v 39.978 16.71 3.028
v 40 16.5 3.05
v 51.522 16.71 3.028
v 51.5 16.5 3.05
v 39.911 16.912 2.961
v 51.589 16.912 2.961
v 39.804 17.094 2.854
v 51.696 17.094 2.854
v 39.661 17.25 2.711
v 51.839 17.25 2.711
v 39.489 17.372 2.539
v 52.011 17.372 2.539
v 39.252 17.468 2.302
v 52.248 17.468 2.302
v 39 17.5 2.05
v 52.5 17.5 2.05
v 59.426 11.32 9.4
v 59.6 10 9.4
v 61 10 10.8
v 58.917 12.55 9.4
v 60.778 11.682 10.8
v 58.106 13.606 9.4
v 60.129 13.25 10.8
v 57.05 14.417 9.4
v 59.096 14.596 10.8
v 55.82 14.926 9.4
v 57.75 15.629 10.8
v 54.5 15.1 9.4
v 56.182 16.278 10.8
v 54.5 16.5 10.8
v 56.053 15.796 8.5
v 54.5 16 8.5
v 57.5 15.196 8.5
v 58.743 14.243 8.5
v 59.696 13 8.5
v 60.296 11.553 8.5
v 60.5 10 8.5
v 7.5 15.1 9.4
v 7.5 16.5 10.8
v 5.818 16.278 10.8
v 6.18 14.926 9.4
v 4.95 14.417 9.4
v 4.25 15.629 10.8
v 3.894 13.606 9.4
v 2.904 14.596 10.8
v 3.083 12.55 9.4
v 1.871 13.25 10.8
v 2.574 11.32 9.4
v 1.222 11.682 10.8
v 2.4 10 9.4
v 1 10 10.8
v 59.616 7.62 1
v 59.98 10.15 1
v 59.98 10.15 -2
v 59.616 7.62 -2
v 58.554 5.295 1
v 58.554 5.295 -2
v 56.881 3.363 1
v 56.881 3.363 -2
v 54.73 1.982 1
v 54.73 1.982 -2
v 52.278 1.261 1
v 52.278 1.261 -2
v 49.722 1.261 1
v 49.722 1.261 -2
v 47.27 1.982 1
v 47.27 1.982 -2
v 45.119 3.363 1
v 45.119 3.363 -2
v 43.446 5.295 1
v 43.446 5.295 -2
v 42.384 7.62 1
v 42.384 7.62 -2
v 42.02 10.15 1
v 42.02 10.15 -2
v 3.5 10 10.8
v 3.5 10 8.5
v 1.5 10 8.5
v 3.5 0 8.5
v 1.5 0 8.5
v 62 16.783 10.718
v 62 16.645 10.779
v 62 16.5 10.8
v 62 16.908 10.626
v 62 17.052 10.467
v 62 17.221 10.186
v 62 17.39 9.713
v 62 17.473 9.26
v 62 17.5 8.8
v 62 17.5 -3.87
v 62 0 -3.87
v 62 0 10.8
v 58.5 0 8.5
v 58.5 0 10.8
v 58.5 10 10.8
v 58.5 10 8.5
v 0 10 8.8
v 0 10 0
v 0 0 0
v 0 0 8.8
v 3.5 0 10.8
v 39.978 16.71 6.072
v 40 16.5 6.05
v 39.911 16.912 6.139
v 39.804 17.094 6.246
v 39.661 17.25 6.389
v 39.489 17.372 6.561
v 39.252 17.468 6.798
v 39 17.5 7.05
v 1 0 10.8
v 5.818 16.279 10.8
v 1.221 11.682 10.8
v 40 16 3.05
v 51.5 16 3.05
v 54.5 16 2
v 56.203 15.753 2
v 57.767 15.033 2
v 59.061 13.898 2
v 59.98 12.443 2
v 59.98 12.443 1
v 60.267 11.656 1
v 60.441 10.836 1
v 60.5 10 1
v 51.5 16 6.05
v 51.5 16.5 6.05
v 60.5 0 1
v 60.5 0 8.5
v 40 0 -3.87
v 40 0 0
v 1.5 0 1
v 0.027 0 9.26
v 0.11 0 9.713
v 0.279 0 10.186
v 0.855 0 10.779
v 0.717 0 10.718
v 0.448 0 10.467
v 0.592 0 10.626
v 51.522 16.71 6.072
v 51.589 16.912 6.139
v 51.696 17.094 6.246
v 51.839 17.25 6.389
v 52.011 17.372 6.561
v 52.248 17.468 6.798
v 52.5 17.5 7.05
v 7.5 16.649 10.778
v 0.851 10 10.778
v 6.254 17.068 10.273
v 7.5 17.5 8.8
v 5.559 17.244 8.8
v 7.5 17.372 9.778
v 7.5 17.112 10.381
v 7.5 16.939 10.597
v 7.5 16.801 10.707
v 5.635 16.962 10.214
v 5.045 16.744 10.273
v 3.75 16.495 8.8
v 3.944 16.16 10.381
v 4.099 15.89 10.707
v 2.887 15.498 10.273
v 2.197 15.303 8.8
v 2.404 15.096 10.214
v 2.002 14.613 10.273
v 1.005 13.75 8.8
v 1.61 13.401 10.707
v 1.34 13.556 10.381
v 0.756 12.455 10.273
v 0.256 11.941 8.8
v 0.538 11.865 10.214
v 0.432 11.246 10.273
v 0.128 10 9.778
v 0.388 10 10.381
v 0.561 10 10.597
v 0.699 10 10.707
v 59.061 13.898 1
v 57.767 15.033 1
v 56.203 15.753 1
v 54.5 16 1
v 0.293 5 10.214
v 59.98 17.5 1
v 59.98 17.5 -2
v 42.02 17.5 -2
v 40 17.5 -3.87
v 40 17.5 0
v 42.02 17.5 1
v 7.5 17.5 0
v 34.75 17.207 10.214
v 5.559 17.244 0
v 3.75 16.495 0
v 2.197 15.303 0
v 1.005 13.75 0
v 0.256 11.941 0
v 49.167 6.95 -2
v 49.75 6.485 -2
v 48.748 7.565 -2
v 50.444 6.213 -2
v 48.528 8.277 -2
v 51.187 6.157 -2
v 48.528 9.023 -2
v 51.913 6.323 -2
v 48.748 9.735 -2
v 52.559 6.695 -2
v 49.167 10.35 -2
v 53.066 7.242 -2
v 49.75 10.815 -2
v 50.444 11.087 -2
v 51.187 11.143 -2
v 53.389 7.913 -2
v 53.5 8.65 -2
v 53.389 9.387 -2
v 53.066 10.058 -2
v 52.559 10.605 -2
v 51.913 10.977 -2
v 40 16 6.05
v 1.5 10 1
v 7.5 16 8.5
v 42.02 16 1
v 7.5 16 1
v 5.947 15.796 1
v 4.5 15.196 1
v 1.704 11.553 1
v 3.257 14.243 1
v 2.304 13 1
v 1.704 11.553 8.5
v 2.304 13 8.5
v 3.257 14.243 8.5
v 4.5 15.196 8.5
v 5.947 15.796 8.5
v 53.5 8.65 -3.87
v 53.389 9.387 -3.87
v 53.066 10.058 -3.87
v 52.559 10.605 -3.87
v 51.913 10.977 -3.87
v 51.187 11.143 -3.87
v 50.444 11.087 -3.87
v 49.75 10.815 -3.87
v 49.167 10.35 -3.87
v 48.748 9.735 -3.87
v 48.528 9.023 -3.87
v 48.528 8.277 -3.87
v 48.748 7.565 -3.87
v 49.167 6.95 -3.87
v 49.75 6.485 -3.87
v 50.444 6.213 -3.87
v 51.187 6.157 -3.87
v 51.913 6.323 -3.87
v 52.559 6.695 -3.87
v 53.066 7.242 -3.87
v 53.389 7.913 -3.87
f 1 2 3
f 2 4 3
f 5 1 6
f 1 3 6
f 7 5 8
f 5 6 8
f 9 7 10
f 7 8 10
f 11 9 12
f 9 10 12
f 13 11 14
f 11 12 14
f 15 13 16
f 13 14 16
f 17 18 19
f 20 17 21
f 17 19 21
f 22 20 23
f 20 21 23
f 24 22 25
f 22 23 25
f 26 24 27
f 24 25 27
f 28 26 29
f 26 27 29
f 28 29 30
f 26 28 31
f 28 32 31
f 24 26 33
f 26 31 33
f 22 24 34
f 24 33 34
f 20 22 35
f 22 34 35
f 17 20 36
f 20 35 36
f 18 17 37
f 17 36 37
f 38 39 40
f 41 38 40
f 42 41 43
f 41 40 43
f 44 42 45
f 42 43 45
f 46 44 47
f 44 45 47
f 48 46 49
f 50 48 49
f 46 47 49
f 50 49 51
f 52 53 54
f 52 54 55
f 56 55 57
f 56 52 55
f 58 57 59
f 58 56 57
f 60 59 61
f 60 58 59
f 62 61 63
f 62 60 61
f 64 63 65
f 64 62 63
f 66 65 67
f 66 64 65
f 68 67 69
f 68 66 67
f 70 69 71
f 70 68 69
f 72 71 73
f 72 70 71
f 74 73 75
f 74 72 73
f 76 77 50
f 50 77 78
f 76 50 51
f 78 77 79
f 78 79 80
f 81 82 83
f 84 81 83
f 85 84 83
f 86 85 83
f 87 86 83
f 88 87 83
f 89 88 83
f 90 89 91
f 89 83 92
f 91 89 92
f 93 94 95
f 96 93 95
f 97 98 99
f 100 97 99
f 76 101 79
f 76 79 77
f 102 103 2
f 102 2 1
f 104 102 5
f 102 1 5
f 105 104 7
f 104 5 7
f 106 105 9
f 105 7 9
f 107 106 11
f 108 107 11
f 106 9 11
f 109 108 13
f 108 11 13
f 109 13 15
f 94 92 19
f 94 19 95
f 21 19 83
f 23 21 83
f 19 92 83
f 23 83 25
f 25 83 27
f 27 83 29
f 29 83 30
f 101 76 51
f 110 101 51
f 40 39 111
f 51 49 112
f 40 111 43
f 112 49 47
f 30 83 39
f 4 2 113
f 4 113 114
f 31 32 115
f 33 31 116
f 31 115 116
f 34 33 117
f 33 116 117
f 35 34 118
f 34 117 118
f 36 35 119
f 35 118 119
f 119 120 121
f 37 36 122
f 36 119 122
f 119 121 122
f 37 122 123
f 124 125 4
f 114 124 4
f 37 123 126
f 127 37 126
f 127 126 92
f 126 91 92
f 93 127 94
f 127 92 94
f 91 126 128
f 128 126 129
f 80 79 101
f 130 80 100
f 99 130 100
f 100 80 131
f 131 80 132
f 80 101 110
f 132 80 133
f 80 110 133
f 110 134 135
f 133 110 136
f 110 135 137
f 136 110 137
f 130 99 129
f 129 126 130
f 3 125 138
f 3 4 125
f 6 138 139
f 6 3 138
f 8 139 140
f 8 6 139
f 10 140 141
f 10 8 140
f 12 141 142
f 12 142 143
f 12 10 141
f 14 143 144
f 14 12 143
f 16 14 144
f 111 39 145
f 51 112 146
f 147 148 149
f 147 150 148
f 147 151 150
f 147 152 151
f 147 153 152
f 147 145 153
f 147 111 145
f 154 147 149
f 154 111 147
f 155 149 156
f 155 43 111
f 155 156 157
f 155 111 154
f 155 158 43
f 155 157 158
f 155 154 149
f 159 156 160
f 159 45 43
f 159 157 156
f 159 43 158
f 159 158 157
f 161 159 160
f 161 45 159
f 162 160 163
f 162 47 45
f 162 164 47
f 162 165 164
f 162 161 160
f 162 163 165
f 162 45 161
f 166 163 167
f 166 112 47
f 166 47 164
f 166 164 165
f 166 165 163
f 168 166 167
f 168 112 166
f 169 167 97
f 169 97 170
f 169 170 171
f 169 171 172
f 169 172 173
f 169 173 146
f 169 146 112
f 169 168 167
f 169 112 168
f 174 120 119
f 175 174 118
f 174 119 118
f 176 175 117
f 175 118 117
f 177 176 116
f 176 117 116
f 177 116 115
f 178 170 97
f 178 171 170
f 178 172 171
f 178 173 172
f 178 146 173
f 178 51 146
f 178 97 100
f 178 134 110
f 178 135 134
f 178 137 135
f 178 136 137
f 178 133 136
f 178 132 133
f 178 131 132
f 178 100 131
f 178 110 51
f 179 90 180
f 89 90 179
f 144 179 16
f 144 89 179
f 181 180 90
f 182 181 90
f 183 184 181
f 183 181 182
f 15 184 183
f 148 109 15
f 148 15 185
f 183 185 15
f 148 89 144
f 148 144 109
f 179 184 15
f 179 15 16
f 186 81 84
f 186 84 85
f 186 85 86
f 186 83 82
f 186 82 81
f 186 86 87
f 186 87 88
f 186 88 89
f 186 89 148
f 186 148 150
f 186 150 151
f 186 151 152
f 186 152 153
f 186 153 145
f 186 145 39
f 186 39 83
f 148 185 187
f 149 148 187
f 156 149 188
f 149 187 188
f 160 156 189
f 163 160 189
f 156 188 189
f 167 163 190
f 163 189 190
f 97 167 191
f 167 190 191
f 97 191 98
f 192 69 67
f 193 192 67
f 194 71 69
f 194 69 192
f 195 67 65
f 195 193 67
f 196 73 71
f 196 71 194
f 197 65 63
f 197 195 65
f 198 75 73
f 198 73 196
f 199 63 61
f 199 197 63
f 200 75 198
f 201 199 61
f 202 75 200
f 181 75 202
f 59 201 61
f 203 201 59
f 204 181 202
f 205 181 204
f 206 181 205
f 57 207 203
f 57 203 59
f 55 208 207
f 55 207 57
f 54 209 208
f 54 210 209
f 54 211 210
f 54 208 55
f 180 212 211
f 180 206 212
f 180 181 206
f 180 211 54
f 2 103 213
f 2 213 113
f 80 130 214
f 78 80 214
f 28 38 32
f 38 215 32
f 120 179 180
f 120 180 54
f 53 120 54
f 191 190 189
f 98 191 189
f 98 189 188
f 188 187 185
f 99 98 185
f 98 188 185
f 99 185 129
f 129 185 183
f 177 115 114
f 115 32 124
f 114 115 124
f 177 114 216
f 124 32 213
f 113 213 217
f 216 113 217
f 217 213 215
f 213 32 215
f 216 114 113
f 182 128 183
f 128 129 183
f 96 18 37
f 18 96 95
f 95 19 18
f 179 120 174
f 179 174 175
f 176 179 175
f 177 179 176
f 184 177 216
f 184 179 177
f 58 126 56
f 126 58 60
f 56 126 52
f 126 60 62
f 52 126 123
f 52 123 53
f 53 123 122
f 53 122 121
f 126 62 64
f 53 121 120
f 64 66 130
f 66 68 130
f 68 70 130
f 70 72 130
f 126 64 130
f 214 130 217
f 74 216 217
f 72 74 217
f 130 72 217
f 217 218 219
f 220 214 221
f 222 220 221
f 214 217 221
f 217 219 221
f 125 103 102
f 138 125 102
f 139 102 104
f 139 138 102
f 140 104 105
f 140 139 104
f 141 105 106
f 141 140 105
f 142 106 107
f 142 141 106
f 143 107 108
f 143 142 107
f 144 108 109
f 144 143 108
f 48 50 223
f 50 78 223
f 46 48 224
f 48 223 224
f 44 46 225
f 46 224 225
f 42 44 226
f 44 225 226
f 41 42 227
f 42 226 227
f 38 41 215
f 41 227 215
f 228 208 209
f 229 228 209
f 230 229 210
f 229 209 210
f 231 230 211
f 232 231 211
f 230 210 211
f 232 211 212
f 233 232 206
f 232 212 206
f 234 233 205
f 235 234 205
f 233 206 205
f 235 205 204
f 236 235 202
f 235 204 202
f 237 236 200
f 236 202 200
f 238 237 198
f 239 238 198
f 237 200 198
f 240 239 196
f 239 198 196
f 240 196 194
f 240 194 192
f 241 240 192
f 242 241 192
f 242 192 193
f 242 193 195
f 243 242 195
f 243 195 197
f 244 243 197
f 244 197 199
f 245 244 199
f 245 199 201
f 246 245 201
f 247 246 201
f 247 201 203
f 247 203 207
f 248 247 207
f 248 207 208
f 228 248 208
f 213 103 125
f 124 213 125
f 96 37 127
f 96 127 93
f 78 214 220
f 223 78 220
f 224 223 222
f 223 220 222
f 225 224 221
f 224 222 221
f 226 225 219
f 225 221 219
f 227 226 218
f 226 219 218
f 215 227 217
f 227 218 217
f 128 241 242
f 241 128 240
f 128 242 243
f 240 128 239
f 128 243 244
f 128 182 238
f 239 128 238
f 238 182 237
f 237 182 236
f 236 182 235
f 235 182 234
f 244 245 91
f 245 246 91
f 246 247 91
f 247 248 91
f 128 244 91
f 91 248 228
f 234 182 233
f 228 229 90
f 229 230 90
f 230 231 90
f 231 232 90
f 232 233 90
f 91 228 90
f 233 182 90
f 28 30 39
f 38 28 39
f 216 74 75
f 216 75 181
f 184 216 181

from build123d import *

# Parameters (mm, degrees)
BOSS_EXTRUDE1_DEPTH  = 10.8
BOSS_EXTRUDE2_DEPTH  = 1
SKETCH3_W            = 2
SKETCH3_H            = 10
BOSS_EXTRUDE3_DEPTH  = 2.3
FILLET1_SIZE         = 2
FILLET1_SIZE_2       = 1
CUT_EXTRUDE1_REACH   = 67.321
SKETCH4_W            = 11.5
SKETCH4_H            = 3
BOSS_EXTRUDE4_DEPTH  = 2.3
CHAMFER1_SIZE        = 1.5
CUT_EXTRUDE2_DEPTH   = 2
BOSS_EXTRUDE6_DEPTH  = 2
FILLET2_R            = 1
BOSS_EXTRUDE36_DEPTH = 1
BOSS_EXTRUDE7_DEPTH  = 1.87
SKETCH11_R           = 2.5
CUT_EXTRUDE3_DEPTH   = 66.681732761


with BuildPart() as part:
    # Sketch1 → Boss-Extrude1 (new body)
    with BuildSketch(Plane.XY):
        with BuildLine():
            ThreePointArc((7.5, 17.5), (2.196699141, 15.303300859), (0, 10))
            Line((0, 10), (0, 0))
            Line((0, 0), (1.5, 0))
            Line((1.5, 0), (1.5, 10))
            ThreePointArc((1.5, 10), (3.257359313, 14.242640687), (7.5, 16))
            Line((7.5, 16), (54.5, 16))
            ThreePointArc((54.5, 16), (58.742640687, 14.242640687), (60.5, 10))
            Line((60.5, 10), (60.5, 0))
            Line((60.5, 0), (62, 0))
            Line((62, 0), (62, 17.5))
            Line((62, 17.5), (7.5, 17.5))
        make_face()
    extrude(amount=BOSS_EXTRUDE1_DEPTH)


with BuildPart() as body_2:
    # Sketch2 → Boss-Extrude2 (new body)
    with BuildSketch(Plane(origin=(0, 0, 0), x_dir=(-1, 0, 0), z_dir=(0, 0, -1))):
        with BuildLine():
            Line((-1.5, 0), (-1.5, 10))
            ThreePointArc((-1.5, 10), (-3.257359313, 14.242640687), (-7.5, 16))
            Line((-7.5, 16), (-54.5, 16))
            ThreePointArc((-54.5, 16), (-58.742640687, 14.242640687), (-60.5, 10))
            Line((-60.5, 10), (-60.5, 0))
            Line((-60.5, 0), (-1.5, 0))
        make_face()
    extrude(amount=-BOSS_EXTRUDE2_DEPTH)

    # Combine1: union part
    add(part.part)

    # Sketch3 → Boss-Extrude3 (add)
    with BuildSketch(Plane.XY.offset(10.8)):
        with Locations((2.5, 5)):
            Rectangle(SKETCH3_W, SKETCH3_H)
        with Locations((59.5, 5)):
            Rectangle(SKETCH3_W, SKETCH3_H)
    extrude(amount=-BOSS_EXTRUDE3_DEPTH)

    # Fillet1
    # a fillet whose section is not a circle: 2, 1 mm, written as the material it takes off along each edge
    with BuildSketch(Plane(origin=(0, 10, 10.8), x_dir=(0, 0, -1), z_dir=(0, -1, 0))) as fillet1_piece_1:
        with BuildLine():
            Bezier((FILLET1_SIZE, 0), (0, 0), (0, FILLET1_SIZE_2), weights=[1, 0.707106781, 1])
            Line((0, FILLET1_SIZE_2), (0, 0))
            Line((0, 0), (FILLET1_SIZE, 0))
        make_face()
    extrude(amount=15, mode=Mode.SUBTRACT)
    with BuildSketch(Plane(origin=(7.5, 10, 10.8), x_dir=(0, 1, 0), z_dir=(1, 0, 0))) as fillet1_piece_2:
        with BuildLine():
            Bezier((7.5, -FILLET1_SIZE), (7.5, 0), (7.5 - FILLET1_SIZE_2, 0), weights=[1, 0.707106781, 1])
            Line((7.5 - FILLET1_SIZE_2, 0), (7.5, 0))
            Line((7.5, 0), (7.5, -FILLET1_SIZE))
        make_face()
    revolve(axis=Axis((7.5, 10, 10.8), (0, 0, 1)), revolution_arc=90, mode=Mode.SUBTRACT)
    with BuildSketch(Plane(origin=(67, 17.5, 10.8), x_dir=(0, 0, -1), z_dir=(-1, 0, 0))) as fillet1_piece_3:
        with BuildLine():
            Bezier((FILLET1_SIZE, 0), (0, 0), (0, FILLET1_SIZE_2), weights=[1, 0.707106781, 1])
            Line((0, FILLET1_SIZE_2), (0, 0))
            Line((0, 0), (FILLET1_SIZE, 0))
        make_face()
    extrude(amount=59.5, mode=Mode.SUBTRACT)

    # Sketch4 → Cut-Extrude1 (cut, up to next)
    with BuildSketch(Plane(origin=(0, 17.5, 0), x_dir=(1, 0, 0), z_dir=(0, 1, 0)), mode=Mode.PRIVATE) as cut_extrude1_sk1:
        with Locations((45.75, -4.55)):
            Rectangle(SKETCH4_W, SKETCH4_H)
    cut_extrude1_tool1 = extrude(cut_extrude1_sk1.sketch, amount=-CUT_EXTRUDE1_REACH, mode=Mode.PRIVATE) & body_2.part
    add(cut_extrude1_tool1.solids().sort_by_distance((45.75, 17.5, 4.55))[0], mode=Mode.SUBTRACT)

    # Sketch5 → Boss-Extrude4 (add)
    with BuildSketch(Plane.XY.offset(10.8)):
        with BuildLine():
            Line((60.5, 10), (59.5, 10))
            ThreePointArc((59.5, 10), (58.035533906, 13.535533906), (54.5, 15))
            Line((54.5, 15), (7.5, 15))
            ThreePointArc((7.5, 15), (3.964466094, 13.535533906), (2.5, 10))
            Line((2.5, 10), (1.5, 10))
            ThreePointArc((1.5, 10), (3.257359313, 14.242640687), (7.5, 16))
            Line((7.5, 16), (54.5, 16))
            ThreePointArc((54.5, 16), (58.742640687, 14.242640687), (60.5, 10))
        make_face()
    extrude(amount=-BOSS_EXTRUDE4_DEPTH)

    # Chamfer1
    chamfer1_edges = [body_2.edges().sort_by_distance(p)[0] for p in [
        (58.035533906, 13.535533906, 10.8),
        (3.964466094, 13.535533906, 10.8),
        (31, 15, 10.8),
    ]]
    chamfer(chamfer1_edges, length=CHAMFER1_SIZE - 0.0001)  # a hair under: the kernel refuses the full size

    # Chamfer3: read off the stored shape, not the designer's step
    # Chamfer3: loft between two sections, ruled curve by curve
    chamfer3_from = [
        Edge.make_three_point_arc((2.4, 10, 9.4), (3.893755416, 13.606244584, 9.4), (7.5, 15.1, 9.4)),
        Edge.make_three_point_arc((54.5, 15.1, 9.4), (58.106244584, 13.606244584, 9.4), (59.6, 10, 9.4)),
        Edge.make_line((7.5, 15.1, 9.4), (54.5, 15.1, 9.4)),
        Edge.make_line((59.6, 10, 9.4), (2.4, 10, 9.4)),
    ]
    chamfer3_to = [
        Edge.make_three_point_arc((1.5, 10, 8.5), (3.257359313, 14.242640687, 8.5), (7.5, 16, 8.5)),
        Edge.make_three_point_arc((54.5, 16, 8.5), (58.742640687, 14.242640687, 8.5), (60.5, 10, 8.5)),
        Edge.make_line((7.5, 16, 8.5), (54.5, 16, 8.5)),
        Edge.make_line((60.5, 10, 8.5), (1.5, 10, 8.5)),
    ]
    chamfer3 = Solid(Shell([*[Face.make_surface_from_curves(chamfer3_from[k], chamfer3_to[k]) for k in range(4)], Face(Wire(chamfer3_from)), Face(Wire(chamfer3_to))]))
    add(chamfer3, mode=Mode.SUBTRACT)

    # Sketch6 → Cut-Extrude2 (cut)
    with BuildSketch(Plane(origin=(0, 0, 0), x_dir=(-1, 0, 0), z_dir=(0, 0, -1))):
        with BuildLine():
            Line((-59.98, 10.15), (-59.98, 16.85))
            Line((-59.98, 16.85), (-59.98, 17.5))
            Line((-59.98, 17.5), (-42.02, 17.5))
            Line((-42.02, 17.5), (-42.02, 16.85))
            Line((-42.02, 16.85), (-42.02, 10.15))
            ThreePointArc((-42.02, 10.15), (-51, 1.17), (-59.98, 10.15))
        make_face()
    extrude(amount=-CUT_EXTRUDE2_DEPTH, mode=Mode.SUBTRACT)

    # Sketch9 → Boss-Extrude6 (add)
    with BuildSketch(Plane(origin=(0, 0, 0), x_dir=(-1, 0, 0), z_dir=(0, 0, -1))):
        with BuildLine():
            Line((-54.5, 0), (-62, 0))
            Line((-62, 0), (-62, 6.85))
            Line((-62, 6.85), (-62, 17.5))
            Line((-62, 17.5), (-59.98, 17.5))
            Line((-59.98, 17.5), (-59.98, 10.15))
            ThreePointArc((-59.98, 10.15), (-51, 1.17), (-42.02, 10.15))
            Line((-42.02, 10.15), (-42.02, 17.5))
            Line((-42.02, 17.5), (-40, 17.5))
            Line((-40, 17.5), (-40, 6.854472052))
            Line((-40, 6.854472052), (-40, 0))
            Line((-40, 0), (-47.292116273, 0))
            Line((-47.292116273, 0), (-54.5, 0))
        make_face()
    extrude(amount=BOSS_EXTRUDE6_DEPTH)

    # Fillet2
    fillet2_edges = [body_2.edges().sort_by_distance(p)[0] for p in [
        (51.5, 17.5, 4.55),
        (45.75, 17.5, 3.05),
        (40, 17.5, 4.55),
        (45.75, 17.5, 6.05),
    ]]
    fillet(fillet2_edges, radius=FILLET2_R)

    # Sketch48 → Boss-Extrude36 (add)
    with BuildSketch(Plane(origin=(0, 0, 2), x_dir=(-1, 0, 0), z_dir=(0, 0, -1))):
        with BuildLine():
            Line((-54.5, 16), (-42.02, 16))
            Line((-42.02, 16), (-42.02, 17.5))
            Line((-42.02, 17.5), (-59.98, 17.5))
            Line((-59.98, 17.5), (-59.98, 12.443276489))
            ThreePointArc((-59.98, 12.443276489), (-57.766522698, 15.032874871), (-54.5, 16))
        make_face()
    extrude(amount=BOSS_EXTRUDE36_DEPTH)

    # Sketch10 → Boss-Extrude7 (add)
    with BuildSketch(Plane(origin=(0, 0, -2), x_dir=(-1, 0, 0), z_dir=(0, 0, -1))):
        Polygon((-54.5, 0), (-62, 0), (-62, 3.4), (-62, 17.5), (-40, 17.5), (-40, 6.854472052), (-40, 0), (-47.292116273, 0), align=None)
    extrude(amount=BOSS_EXTRUDE7_DEPTH)

    # Sketch11 → Cut-Extrude3 (cut, through all)
    with BuildSketch(Plane.XY.offset(-2)):
        with Locations((51, 8.65)):
            Circle(SKETCH11_R)
    extrude(amount=-CUT_EXTRUDE3_DEPTH, mode=Mode.SUBTRACT)


solid = body_2.part
